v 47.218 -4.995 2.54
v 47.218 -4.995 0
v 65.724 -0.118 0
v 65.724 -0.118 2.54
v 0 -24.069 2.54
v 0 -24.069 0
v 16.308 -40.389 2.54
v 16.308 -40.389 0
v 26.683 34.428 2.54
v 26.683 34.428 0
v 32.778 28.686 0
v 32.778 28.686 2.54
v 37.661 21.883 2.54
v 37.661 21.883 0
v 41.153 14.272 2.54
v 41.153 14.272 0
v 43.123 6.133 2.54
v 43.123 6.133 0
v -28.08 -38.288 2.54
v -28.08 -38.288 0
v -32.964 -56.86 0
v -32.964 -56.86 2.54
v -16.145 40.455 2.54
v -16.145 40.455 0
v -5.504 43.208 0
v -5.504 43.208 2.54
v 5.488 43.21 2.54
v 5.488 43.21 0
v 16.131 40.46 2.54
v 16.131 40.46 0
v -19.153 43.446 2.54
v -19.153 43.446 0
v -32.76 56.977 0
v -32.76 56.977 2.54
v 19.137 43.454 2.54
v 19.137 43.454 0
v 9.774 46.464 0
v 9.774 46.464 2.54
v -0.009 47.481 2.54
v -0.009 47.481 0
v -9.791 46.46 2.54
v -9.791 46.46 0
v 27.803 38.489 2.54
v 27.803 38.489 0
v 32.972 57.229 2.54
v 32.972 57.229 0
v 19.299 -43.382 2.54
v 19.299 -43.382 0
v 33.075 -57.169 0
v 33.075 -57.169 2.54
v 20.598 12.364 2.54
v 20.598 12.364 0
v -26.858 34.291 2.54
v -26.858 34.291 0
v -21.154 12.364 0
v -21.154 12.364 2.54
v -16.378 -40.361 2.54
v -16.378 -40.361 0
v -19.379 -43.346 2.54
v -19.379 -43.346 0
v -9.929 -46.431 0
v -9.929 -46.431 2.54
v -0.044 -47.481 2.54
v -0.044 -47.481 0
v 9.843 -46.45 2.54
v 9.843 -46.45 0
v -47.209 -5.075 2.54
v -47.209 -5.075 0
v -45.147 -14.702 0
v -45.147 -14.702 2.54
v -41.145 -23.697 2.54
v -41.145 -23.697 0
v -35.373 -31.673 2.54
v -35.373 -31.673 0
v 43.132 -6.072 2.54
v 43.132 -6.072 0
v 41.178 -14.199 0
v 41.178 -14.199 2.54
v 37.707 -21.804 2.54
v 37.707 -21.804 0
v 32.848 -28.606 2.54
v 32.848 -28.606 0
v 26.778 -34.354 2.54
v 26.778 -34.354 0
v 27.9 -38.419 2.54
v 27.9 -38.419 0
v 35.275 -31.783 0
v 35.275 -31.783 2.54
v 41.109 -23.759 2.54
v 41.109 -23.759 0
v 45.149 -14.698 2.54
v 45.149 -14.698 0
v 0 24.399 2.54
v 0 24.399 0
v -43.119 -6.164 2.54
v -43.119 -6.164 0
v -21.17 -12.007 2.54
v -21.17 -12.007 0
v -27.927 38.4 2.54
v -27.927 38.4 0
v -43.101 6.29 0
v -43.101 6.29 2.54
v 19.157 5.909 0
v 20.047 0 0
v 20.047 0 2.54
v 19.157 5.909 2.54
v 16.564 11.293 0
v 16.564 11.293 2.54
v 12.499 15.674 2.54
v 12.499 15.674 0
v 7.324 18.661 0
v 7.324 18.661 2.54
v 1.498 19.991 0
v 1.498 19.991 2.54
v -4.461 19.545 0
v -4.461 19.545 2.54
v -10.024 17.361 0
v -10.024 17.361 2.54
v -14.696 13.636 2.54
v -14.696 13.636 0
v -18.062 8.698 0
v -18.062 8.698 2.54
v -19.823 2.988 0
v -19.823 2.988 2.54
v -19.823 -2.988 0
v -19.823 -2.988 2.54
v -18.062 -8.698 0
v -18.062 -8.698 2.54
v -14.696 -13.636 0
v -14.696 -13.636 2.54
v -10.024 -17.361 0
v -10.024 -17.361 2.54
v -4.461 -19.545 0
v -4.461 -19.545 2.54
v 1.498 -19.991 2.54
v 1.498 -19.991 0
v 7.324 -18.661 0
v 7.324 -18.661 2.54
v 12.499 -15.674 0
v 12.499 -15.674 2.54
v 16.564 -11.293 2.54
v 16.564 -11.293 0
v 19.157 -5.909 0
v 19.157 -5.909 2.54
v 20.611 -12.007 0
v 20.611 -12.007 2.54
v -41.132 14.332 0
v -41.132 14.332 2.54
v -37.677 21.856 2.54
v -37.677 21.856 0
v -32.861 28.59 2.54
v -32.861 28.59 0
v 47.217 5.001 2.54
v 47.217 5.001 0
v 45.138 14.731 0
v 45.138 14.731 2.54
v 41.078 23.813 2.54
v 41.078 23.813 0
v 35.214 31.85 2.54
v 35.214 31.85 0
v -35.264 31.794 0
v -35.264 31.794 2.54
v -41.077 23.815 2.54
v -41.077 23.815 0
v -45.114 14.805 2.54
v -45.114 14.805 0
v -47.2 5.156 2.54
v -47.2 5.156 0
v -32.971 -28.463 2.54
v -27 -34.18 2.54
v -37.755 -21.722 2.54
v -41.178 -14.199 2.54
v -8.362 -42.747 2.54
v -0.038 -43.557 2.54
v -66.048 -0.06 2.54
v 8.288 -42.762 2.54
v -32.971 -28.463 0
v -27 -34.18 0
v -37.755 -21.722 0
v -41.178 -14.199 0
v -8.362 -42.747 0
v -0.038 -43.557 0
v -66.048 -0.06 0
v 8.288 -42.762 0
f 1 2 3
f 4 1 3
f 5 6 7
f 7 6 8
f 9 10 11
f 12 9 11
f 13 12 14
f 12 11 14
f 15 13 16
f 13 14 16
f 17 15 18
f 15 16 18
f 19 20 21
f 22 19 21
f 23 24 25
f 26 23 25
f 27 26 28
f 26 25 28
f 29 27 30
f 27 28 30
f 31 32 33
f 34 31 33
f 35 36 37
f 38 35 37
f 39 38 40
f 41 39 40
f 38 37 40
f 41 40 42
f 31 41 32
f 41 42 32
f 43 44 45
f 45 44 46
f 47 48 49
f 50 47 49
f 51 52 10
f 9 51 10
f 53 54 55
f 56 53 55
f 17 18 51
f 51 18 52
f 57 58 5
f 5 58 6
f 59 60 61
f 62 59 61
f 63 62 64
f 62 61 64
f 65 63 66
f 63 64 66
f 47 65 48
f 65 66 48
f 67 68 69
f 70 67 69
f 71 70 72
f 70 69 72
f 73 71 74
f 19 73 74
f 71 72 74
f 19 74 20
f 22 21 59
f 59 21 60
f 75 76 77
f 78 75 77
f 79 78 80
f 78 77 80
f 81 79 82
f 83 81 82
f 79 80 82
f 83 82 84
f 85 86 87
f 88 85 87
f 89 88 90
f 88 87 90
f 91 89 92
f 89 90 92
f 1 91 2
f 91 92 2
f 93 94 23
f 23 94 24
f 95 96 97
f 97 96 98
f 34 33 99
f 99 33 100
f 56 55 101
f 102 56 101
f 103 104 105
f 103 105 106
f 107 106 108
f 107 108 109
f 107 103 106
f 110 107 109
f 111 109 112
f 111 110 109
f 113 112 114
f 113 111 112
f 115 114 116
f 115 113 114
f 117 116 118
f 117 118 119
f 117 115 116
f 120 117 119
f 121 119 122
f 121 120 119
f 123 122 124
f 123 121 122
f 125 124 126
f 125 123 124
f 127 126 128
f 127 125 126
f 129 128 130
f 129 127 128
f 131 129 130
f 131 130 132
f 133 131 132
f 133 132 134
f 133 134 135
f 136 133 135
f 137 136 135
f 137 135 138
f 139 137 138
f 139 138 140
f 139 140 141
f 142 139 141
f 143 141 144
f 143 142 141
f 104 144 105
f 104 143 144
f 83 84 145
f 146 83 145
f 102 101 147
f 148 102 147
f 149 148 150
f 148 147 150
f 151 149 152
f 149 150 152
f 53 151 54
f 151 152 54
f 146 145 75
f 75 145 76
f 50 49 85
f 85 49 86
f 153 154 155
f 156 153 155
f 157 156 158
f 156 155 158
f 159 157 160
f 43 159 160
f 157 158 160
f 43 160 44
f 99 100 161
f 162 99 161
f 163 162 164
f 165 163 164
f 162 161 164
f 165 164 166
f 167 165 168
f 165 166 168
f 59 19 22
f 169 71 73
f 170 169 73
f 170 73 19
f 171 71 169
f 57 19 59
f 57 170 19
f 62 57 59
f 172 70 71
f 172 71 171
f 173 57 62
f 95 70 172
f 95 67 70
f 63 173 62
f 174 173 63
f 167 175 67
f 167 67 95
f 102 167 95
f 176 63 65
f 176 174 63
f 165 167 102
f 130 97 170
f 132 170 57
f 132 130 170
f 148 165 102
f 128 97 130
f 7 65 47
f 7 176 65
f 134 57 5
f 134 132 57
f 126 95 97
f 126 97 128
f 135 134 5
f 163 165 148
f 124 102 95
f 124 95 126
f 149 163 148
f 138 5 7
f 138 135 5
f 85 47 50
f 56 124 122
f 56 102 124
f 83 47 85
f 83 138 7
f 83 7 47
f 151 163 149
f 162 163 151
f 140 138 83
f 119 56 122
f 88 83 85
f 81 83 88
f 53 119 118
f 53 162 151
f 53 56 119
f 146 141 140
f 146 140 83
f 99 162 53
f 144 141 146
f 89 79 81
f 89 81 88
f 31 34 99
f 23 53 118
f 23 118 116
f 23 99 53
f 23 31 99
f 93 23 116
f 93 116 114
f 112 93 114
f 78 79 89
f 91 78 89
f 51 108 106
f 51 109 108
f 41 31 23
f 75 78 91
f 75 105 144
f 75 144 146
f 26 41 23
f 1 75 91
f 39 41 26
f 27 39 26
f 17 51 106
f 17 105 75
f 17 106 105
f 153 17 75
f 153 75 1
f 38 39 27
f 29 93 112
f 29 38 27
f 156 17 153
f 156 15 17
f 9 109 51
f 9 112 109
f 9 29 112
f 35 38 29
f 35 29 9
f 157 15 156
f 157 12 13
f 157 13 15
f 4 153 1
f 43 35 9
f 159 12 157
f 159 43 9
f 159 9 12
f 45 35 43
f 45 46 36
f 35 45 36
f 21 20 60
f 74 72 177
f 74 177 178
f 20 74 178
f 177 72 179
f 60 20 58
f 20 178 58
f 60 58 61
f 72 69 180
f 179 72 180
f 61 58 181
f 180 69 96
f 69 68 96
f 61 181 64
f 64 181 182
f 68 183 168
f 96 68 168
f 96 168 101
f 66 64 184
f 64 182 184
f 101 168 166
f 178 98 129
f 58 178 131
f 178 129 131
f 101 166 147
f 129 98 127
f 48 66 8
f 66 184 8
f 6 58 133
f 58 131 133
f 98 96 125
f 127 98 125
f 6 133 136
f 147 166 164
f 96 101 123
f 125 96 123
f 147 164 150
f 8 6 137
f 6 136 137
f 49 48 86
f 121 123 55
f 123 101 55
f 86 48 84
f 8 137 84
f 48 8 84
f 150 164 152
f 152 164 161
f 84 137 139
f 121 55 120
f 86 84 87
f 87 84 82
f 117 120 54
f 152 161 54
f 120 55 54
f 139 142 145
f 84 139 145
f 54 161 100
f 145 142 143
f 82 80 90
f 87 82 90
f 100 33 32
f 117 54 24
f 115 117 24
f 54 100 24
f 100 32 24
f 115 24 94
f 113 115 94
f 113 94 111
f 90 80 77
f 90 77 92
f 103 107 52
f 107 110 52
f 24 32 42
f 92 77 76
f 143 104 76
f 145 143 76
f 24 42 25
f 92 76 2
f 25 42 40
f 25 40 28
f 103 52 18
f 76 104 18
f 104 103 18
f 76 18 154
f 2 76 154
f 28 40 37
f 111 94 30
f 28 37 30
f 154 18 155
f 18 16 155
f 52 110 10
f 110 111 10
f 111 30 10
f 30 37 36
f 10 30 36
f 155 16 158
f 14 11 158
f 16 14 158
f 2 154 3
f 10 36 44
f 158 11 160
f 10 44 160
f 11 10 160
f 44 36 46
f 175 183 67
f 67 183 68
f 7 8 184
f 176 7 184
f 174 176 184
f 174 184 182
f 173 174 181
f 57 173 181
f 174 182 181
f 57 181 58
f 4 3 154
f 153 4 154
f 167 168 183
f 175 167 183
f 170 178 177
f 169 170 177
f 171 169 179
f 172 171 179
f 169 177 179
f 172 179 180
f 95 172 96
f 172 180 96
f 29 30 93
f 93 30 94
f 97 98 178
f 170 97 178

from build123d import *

# Parameters (mm, degrees)
F0_R     = 20.047266
F1_DEPTH = 2.54


with BuildPart() as f1:
    # F0 (on Top) → F1 (new body)
    with BuildSketch(Plane.XY):
        with BuildLine():
            ThreePointArc((47.216884, 5.001183), (41.077621, 23.813338), (27.803349, 38.489217))
            Line((27.803349, 38.489217), (32.972034, 57.228676))
            Line((32.972034, 57.228676), (19.137083, 43.453631))
            ThreePointArc((19.137083, 43.453631), (-0.008949, 47.481006), (-19.153462, 43.446414))
            Line((-19.153462, 43.446414), (-32.759971, 56.977294))
            Line((-32.759971, 56.977294), (-27.926999, 38.399593))
            ThreePointArc((-27.926999, 38.399593), (-41.076878, 23.814619), (-47.200233, 5.155968))
            Line((-47.200233, 5.155968), (-66.047504, -0.059719))
            Line((-66.047504, -0.059719), (-47.209021, -5.074873))
            ThreePointArc((-47.209021, -5.074873), (-41.1448, -23.697077), (-28.080388, -38.287568))
            Line((-28.080388, -38.287568), (-32.963799, -56.859614))
            Line((-32.963799, -56.859614), (-19.379036, -43.346268))
            ThreePointArc((-19.379036, -43.346268), (-0.043958, -47.480986), (19.298742, -43.382076))
            Line((19.298742, -43.382076), (33.07547, -57.168957))
            Line((33.07547, -57.168957), (27.900469, -38.418873))
            ThreePointArc((27.900469, -38.418873), (41.109245, -23.758703), (47.217551, -4.994882))
            Line((47.217551, -4.994882), (65.72377, -0.11768))
            Line((65.72377, -0.11768), (47.216884, 5.001183))
        make_face()
        with BuildLine():
            Line((-43.119181, -6.163664), (-21.170047, -12.00693))
            Line((-21.170047, -12.00693), (-27.000214, -34.17957))
            ThreePointArc((-27.000214, -34.17957), (-37.754538, -21.722095), (-43.119181, -6.163664))
        make_face(mode=Mode.SUBTRACT)
        with BuildLine():
            Line((-16.37804, -40.36105), (0, -24.069112))
            Line((0, -24.069112), (16.308193, -40.389323))
            ThreePointArc((16.308193, -40.389323), (-0.037676, -43.557469), (-16.37804, -40.36105))
        make_face(mode=Mode.SUBTRACT)
        with BuildLine():
            Line((26.778455, -34.353586), (20.610804, -12.00693))
            Line((20.610804, -12.00693), (43.13225, -6.071539))
            ThreePointArc((43.13225, -6.071539), (37.707363, -21.803884), (26.778455, -34.353586))
        make_face(mode=Mode.SUBTRACT)
        Circle(F0_R, mode=Mode.SUBTRACT)
        with BuildLine():
            Line((-26.858221, 34.29126), (-21.153839, 12.3639))
            Line((-21.153839, 12.3639), (-43.100875, 6.290401))
            ThreePointArc((-43.100875, 6.290401), (-37.677324, 21.855749), (-26.858221, 34.29126))
        make_face(mode=Mode.SUBTRACT)
        with BuildLine():
            Line((43.123499, 6.133382), (20.597509, 12.3639))
            Line((20.597509, 12.3639), (26.683107, 34.427697))
            ThreePointArc((26.683107, 34.427697), (37.661421, 21.883142), (43.123499, 6.133382))
        make_face(mode=Mode.SUBTRACT)
        with BuildLine():
            Line((16.130895, 40.460459), (0, 24.399411))
            Line((0, 24.399411), (-16.145114, 40.454787))
            ThreePointArc((-16.145114, 40.454787), (-0.007654, 43.557485), (16.130895, 40.460459))
        make_face(mode=Mode.SUBTRACT)
    extrude(amount=F1_DEPTH)


solid = f1.part
